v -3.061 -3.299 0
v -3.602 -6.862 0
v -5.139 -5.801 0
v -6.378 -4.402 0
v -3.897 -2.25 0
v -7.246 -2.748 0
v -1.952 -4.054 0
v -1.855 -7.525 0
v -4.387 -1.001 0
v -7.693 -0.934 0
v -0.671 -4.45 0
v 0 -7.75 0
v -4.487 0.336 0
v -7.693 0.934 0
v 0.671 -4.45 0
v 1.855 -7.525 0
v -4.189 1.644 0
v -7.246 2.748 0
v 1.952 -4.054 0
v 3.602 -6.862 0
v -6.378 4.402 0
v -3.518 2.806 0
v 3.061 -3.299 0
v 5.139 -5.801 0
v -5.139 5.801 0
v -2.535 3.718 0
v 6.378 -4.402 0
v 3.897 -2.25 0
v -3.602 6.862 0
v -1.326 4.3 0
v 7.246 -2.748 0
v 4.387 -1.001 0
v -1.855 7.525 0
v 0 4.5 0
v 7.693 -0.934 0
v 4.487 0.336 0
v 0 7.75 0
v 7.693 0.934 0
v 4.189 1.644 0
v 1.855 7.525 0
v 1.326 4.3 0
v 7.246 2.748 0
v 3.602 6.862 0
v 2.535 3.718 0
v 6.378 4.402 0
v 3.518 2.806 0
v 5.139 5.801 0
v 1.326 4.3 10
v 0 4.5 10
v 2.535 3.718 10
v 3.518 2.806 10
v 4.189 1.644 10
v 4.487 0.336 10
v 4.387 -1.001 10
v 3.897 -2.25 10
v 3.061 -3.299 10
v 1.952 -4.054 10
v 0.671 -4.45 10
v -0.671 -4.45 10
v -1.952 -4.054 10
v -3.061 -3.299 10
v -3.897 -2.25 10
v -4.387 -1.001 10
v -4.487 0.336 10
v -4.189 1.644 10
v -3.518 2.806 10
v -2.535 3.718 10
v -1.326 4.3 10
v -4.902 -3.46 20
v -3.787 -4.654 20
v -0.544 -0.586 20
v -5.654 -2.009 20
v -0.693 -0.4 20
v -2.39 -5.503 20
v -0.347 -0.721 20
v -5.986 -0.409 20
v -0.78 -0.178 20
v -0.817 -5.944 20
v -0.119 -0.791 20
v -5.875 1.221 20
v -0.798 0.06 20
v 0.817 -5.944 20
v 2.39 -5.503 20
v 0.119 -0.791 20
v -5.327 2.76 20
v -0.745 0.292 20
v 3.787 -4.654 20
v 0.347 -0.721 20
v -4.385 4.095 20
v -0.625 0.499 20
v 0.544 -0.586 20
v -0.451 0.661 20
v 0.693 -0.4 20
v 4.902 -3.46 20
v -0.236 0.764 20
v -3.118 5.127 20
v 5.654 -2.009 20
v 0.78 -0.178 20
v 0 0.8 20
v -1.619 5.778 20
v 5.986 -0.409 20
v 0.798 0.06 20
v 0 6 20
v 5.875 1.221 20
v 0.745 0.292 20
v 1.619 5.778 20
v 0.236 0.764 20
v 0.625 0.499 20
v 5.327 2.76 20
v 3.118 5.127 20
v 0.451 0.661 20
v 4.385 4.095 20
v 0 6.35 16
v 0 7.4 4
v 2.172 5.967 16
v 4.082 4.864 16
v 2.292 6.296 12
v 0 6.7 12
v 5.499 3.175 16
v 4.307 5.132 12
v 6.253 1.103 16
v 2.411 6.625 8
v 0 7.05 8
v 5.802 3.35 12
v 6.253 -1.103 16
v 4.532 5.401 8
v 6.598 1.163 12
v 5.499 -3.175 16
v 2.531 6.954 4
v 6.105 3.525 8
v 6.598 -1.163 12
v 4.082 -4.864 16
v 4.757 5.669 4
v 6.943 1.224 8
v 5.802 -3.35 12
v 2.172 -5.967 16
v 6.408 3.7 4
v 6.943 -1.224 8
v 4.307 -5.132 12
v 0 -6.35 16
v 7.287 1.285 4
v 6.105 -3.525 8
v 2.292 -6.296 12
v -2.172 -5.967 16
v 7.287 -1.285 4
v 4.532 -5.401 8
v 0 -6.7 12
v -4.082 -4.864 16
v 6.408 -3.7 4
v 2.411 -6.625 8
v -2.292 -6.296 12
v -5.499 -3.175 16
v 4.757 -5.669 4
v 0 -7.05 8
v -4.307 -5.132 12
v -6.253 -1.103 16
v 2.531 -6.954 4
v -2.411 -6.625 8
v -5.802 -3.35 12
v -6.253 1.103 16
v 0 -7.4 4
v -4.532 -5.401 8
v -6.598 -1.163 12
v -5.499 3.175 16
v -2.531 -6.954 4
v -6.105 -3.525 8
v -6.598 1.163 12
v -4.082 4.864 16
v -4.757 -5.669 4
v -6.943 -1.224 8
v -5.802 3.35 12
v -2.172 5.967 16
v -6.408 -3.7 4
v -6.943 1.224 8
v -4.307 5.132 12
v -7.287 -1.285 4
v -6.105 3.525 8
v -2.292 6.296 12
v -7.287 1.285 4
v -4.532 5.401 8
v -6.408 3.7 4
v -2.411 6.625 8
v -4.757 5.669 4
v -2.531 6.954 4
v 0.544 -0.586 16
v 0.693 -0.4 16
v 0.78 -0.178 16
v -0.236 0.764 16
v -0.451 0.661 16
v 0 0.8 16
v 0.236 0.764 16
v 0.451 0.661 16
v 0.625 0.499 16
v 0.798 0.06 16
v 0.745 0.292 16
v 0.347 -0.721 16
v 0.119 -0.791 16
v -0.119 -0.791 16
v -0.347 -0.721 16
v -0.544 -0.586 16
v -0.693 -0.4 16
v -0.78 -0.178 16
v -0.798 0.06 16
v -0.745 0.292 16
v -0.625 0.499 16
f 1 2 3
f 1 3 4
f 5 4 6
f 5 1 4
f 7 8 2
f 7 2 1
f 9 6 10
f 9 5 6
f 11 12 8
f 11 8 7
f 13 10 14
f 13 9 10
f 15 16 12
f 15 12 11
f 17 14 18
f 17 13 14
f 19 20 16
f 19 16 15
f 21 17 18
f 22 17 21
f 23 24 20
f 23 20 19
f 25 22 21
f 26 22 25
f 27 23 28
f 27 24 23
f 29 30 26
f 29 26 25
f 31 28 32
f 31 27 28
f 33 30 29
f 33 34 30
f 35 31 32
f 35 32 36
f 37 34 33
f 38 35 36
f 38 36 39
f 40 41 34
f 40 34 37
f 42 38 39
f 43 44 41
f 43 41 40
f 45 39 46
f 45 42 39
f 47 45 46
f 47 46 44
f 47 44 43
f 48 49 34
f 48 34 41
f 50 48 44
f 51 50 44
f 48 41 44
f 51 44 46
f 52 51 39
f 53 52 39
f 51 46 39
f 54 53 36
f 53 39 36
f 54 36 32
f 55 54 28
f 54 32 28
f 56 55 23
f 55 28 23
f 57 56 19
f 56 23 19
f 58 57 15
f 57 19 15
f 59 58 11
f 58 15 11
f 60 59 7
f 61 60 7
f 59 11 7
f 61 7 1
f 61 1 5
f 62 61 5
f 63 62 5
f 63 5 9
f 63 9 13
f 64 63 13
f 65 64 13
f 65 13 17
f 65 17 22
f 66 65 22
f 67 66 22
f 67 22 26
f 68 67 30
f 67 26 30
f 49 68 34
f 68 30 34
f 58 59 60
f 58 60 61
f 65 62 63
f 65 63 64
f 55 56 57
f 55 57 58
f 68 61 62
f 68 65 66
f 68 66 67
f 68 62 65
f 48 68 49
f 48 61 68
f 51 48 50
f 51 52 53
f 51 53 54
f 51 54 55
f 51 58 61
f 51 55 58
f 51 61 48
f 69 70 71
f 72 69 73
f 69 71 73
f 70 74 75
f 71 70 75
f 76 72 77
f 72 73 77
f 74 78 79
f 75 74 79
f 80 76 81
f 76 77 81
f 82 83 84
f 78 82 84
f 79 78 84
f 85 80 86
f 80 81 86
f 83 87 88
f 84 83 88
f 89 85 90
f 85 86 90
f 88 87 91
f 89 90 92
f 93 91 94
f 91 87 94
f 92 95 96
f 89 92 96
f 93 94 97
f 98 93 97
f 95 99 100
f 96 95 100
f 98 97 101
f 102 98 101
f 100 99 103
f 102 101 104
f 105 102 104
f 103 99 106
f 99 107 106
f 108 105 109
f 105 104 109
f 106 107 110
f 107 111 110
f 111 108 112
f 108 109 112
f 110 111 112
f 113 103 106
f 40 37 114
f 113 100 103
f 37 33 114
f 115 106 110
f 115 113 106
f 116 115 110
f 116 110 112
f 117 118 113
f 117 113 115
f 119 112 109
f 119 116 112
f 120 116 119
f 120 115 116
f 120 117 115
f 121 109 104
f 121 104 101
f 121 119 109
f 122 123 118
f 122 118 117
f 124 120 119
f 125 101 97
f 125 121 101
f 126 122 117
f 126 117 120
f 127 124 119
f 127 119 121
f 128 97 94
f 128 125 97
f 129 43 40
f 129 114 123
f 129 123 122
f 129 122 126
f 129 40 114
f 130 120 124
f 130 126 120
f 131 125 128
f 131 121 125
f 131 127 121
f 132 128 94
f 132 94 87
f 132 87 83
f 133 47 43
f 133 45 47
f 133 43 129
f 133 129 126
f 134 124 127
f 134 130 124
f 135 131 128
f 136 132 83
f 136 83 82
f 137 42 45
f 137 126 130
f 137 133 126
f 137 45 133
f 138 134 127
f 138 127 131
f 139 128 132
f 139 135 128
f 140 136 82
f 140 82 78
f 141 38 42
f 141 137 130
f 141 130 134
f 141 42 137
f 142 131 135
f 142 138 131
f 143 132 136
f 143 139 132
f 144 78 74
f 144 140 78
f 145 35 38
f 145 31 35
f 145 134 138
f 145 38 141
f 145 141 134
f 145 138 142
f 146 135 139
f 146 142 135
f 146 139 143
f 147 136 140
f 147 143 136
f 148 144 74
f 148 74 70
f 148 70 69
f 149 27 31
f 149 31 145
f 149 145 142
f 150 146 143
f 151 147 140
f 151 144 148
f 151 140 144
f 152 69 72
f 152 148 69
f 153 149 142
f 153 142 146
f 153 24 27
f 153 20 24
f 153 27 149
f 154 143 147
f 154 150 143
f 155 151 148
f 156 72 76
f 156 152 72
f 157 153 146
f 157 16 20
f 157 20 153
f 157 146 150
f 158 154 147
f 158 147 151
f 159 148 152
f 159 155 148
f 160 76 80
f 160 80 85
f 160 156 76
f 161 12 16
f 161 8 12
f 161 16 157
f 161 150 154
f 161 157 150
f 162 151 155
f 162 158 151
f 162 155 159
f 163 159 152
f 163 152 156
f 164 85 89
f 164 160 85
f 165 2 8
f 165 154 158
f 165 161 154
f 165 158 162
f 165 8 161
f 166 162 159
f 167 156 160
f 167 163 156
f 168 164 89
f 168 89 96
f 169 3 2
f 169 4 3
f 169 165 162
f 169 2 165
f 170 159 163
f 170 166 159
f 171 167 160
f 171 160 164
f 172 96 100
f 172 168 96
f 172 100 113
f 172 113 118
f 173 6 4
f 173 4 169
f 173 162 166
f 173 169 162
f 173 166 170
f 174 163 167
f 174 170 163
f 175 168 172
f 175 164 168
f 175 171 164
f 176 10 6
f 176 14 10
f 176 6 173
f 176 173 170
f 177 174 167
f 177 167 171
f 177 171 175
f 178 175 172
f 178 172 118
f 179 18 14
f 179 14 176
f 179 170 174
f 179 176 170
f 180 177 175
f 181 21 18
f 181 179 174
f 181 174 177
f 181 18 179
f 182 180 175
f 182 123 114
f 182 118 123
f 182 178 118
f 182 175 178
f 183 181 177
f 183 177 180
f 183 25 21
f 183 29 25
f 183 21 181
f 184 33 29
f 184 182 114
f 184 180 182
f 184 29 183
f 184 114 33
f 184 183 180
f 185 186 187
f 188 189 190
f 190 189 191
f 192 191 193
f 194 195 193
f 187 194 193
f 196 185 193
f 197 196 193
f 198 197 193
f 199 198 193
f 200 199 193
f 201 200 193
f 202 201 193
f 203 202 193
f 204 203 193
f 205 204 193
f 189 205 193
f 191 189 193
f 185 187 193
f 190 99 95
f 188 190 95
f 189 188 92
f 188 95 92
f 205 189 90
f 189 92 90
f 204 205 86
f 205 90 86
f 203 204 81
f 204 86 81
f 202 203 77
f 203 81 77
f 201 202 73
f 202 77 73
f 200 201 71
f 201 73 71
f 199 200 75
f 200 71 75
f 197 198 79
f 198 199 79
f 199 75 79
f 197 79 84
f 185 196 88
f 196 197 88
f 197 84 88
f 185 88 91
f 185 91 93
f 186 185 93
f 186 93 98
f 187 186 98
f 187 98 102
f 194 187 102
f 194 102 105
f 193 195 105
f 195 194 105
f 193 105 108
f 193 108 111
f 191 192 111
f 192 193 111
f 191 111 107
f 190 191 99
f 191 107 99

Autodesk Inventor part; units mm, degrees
ref_plane "YZ Plane" through (0, 0, 0) normal (1, 0, 0) x (0, 1, 0)
ref_plane "XZ Plane" through (0, 0, 0) normal (0, 1, 0) x (-1, 0, 0)
ref_plane "XY Plane" through (0, 0, 0) normal (0, 0, 1) x (1, 0, 0)
sketch "Sketch1" plane through (0, 0, 0) normal (1, 0, 0) x (0, 1, 0)
  line L0 (0, 20) -> (6, 20) construction
  arc A0 (7.7498, 0) -> (6, 20) centre (-30.6677, 6.7154) ccw construction
  line L1 (0, 16) -> (0, 0) construction
  line L2 (6, 20) -> (2.4961, 20) construction
  line L3 (7.7498, 0) -> (4.5, 0) construction
  line L4 (4.5, 10) -> (0, 10)
  line L5 (4.5, 10) -> (4.5, 0)
  line L6 (0, 16) -> (0, 10)
  line L7 (7.7498, 0) -> (6, 20) construction
  line L8 (4.5, 0) -> (7.7498, 0)
  line L9 (7.7498, 0) -> (6, 20)
  line L10 (0, 16) -> (0.8, 16)
  line L11 (0.8, 16) -> (0.8, 20)
  line L12 (0.8, 20) -> (6, 20)
  dimension "d0" = 6
  dimension "d5" = 4.5
  dimension "d11" = 10
  dimension "d12" = 20
  dimension "d13" = 95
  dimension "d21" = 4
  dimension "d22" = 0.8
revolve "Revolution1" add sketch "Sketch1" angle 360 about axis through (0, 0, 16) along (0, 0, -1)
properties part number "brush fitting parta v4"
